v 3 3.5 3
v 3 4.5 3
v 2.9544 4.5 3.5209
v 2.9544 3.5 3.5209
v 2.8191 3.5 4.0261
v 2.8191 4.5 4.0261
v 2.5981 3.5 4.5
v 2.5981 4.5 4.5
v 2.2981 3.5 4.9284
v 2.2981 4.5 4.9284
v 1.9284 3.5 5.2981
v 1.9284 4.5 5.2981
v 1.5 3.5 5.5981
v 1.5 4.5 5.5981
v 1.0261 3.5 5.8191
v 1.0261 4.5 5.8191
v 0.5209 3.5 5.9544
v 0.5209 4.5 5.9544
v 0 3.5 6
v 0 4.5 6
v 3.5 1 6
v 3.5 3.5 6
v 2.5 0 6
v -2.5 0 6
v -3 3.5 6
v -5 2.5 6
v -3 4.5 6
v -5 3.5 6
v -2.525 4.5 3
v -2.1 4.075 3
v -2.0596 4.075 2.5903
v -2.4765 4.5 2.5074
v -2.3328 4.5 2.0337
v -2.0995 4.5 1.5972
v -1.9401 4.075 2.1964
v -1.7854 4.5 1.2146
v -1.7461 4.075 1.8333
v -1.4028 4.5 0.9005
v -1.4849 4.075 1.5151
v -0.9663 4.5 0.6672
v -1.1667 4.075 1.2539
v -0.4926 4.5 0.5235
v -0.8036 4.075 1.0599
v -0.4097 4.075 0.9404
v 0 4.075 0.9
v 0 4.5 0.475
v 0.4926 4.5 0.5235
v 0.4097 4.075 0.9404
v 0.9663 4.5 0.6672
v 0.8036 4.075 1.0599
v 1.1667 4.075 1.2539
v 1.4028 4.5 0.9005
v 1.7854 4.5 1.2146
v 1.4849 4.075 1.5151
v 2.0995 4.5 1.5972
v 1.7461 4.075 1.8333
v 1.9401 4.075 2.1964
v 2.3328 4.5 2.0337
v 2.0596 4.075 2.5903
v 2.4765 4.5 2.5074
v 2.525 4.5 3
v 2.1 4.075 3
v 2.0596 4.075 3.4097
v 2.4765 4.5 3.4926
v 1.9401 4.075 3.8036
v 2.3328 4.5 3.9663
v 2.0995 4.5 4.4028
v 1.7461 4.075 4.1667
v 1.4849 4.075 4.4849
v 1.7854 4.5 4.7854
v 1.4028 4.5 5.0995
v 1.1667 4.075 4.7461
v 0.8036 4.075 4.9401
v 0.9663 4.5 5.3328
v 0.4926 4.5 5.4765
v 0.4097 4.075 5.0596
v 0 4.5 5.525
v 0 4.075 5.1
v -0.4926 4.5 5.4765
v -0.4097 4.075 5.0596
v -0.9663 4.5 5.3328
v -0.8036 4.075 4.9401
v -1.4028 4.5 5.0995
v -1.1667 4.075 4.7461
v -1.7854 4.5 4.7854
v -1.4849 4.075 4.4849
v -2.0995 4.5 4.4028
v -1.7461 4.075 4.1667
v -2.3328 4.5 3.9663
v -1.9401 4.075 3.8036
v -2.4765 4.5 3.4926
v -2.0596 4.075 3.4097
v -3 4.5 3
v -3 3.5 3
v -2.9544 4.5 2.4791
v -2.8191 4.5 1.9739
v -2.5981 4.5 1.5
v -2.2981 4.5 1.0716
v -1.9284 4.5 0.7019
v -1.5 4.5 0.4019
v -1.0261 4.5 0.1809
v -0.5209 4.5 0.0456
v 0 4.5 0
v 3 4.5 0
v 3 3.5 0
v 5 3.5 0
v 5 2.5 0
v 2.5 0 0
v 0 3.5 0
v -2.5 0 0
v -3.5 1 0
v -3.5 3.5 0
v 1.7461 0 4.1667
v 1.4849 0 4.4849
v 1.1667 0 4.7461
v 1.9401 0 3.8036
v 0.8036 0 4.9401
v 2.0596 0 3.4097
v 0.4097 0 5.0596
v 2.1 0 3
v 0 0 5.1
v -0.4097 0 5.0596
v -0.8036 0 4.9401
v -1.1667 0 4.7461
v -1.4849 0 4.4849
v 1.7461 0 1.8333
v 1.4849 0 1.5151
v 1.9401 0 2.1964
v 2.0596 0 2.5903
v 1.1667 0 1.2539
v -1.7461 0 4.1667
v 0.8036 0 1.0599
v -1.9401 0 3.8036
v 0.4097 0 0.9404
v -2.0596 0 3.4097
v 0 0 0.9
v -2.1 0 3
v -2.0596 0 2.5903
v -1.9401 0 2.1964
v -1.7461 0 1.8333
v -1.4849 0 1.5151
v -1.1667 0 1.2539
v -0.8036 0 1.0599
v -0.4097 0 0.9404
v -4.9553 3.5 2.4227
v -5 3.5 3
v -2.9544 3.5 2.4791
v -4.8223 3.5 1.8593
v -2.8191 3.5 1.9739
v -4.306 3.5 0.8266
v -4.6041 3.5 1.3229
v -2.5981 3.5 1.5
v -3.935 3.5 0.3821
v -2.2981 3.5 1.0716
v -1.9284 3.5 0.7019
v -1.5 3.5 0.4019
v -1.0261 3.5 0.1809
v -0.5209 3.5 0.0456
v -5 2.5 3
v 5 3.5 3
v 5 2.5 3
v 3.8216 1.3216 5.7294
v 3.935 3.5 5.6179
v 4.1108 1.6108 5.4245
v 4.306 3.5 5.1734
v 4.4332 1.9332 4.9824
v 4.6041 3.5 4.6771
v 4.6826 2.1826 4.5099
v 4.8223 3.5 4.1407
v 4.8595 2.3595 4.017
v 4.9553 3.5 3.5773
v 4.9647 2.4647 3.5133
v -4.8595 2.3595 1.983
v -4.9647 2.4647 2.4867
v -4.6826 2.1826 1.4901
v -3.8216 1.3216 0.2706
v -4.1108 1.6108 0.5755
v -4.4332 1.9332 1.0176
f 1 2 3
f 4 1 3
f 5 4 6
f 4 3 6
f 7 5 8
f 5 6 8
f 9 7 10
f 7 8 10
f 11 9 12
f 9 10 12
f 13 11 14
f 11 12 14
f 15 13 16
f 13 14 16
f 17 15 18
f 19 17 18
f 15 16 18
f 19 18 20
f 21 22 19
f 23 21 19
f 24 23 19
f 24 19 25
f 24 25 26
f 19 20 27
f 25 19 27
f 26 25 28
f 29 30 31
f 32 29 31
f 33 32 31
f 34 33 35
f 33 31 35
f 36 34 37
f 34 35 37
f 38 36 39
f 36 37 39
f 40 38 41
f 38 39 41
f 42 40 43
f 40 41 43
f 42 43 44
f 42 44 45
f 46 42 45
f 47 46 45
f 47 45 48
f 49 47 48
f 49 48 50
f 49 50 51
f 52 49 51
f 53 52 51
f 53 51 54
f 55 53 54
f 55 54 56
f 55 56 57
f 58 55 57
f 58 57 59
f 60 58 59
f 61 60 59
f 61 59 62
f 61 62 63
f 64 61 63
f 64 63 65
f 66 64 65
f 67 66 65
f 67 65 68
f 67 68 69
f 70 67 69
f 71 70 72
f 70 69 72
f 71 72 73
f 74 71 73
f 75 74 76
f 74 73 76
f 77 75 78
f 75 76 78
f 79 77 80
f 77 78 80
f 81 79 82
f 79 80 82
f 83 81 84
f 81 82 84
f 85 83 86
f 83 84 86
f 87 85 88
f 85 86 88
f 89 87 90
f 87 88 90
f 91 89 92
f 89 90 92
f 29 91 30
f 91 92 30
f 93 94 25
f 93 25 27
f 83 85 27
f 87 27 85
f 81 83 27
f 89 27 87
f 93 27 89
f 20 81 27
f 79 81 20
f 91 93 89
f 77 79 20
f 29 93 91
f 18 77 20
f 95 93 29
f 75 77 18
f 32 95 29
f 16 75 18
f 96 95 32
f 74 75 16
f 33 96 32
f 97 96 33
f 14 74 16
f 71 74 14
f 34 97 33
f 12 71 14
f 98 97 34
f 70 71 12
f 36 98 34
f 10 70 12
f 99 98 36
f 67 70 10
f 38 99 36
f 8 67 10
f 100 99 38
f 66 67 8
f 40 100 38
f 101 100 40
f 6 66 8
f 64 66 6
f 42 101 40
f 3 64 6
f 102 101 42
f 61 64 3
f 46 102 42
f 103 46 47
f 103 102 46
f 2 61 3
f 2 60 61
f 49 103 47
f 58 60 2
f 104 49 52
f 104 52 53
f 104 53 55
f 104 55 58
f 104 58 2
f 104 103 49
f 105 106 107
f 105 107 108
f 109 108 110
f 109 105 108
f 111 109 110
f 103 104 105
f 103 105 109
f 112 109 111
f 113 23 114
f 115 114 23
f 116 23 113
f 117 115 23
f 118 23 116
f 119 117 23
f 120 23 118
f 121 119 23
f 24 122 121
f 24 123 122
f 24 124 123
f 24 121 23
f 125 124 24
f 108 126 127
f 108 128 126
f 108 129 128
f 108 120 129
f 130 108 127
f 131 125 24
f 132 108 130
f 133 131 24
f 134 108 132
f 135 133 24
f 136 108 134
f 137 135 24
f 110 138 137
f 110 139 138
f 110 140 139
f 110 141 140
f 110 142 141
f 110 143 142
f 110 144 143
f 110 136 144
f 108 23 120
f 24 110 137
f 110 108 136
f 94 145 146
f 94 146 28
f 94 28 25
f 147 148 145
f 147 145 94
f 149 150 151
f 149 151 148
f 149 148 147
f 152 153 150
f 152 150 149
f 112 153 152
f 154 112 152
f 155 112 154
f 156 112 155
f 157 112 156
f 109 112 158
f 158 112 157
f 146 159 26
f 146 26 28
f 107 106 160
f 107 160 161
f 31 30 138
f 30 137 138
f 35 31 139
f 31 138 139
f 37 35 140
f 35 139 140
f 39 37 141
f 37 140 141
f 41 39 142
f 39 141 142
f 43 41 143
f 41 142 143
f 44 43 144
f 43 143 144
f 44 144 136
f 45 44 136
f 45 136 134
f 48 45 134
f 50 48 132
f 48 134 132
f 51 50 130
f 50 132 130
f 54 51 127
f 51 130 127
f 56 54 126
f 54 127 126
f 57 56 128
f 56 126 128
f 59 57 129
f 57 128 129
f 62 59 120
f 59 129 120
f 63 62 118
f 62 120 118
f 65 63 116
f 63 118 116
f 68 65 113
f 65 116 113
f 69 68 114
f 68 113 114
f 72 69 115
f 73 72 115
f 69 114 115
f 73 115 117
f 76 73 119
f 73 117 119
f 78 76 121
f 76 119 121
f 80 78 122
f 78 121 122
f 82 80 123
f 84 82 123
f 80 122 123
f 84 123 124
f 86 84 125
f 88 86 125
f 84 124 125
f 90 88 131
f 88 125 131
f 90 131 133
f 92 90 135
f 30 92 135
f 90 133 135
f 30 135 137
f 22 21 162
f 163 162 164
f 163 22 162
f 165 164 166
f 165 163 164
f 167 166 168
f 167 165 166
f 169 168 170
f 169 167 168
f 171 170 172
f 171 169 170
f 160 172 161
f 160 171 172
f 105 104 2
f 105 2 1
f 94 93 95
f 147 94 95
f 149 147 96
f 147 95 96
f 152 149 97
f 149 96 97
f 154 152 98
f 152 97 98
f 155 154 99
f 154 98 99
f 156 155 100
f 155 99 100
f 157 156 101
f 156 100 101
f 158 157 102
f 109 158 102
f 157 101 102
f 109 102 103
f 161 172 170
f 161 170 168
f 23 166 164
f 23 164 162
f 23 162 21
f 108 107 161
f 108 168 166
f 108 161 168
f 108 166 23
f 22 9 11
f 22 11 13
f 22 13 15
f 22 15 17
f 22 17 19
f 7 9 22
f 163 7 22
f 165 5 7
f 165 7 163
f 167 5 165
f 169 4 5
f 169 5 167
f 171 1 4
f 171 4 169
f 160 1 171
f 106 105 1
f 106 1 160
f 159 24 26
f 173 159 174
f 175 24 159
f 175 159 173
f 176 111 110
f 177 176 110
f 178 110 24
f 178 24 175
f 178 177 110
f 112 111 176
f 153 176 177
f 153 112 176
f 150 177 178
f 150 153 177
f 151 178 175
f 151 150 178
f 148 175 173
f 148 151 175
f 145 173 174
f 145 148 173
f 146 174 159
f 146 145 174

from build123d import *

# Parameters (mm, degrees)
BOSS_EXTRUDE1_DEPTH             = 6
CUT_EXTRUDE1_DEPTH              = 1
CUT_EXTRUDE2_DEPTH              = 4.5
M5X0_8_TAPPED_HOLE1_D           = 4.2
M5X0_8_TAPPED_HOLE1_CSINK_D     = 5.05
M5X0_8_TAPPED_HOLE1_CSINK_ANGLE = 90


with BuildPart() as part:
    # Sketch1 → Boss-Extrude1 (new body)
    with BuildSketch(Plane.XY):
        Polygon((-3, 4.5), (3, 4.5), (3, 3.5), (5, 3.5), (5, 2.5), (2.5, 0), (-2.5, 0), (-5, 2.5), (-5, 3.5), (-3, 3.5), align=None)
    extrude(amount=BOSS_EXTRUDE1_DEPTH)

    # Sketch2 → Cut-Extrude1 (cut)
    with BuildSketch(Plane(origin=(0, 4.5, 0), x_dir=(1, 0, 0), z_dir=(0, 1, 0))):
        with BuildLine():
            Line((0, -6), (3, -6))
            Line((3, -6), (3, -3))
            ThreePointArc((3, -3), (2.121320344, -5.121320344), (0, -6))
        make_face()
        with BuildLine():
            Line((0, 0), (-3, 0))
            Line((-3, 0), (-3, -3))
            ThreePointArc((-3, -3), (-2.121320344, -0.878679656), (0, 0))
        make_face()
    extrude(amount=-CUT_EXTRUDE1_DEPTH, mode=Mode.SUBTRACT)

    # Sketch3 → Cut-Extrude2 (cut, through all)
    with BuildSketch(Plane(origin=(0, 3.5, 0), x_dir=(1, 0, 0), z_dir=(0, 1, 0))):
        with BuildLine():
            Line((5, -3), (5, -6))
            Line((5, -6), (3.5, -6))
            ThreePointArc((3.5, -6), (4.604101966, -4.677050983), (5, -3))
        make_face()
        with BuildLine():
            Line((-5, 0), (-3.5, 0))
            ThreePointArc((-3.5, 0), (-4.604101966, -1.322949017), (-5, -3))
            Line((-5, -3), (-5, 0))
        make_face()
    extrude(amount=-CUT_EXTRUDE2_DEPTH, mode=Mode.SUBTRACT)

    # M5x0.8 Tapped Hole1 (through all)
    with Locations(Plane(origin=(0, 4.5, 0), x_dir=(1, 0, 0), z_dir=(0, 1, 0))):
        with Locations((0, -3)):
            CounterSinkHole(M5X0_8_TAPPED_HOLE1_D / 2, M5X0_8_TAPPED_HOLE1_CSINK_D / 2, counter_sink_angle=M5X0_8_TAPPED_HOLE1_CSINK_ANGLE)


solid = part.part
